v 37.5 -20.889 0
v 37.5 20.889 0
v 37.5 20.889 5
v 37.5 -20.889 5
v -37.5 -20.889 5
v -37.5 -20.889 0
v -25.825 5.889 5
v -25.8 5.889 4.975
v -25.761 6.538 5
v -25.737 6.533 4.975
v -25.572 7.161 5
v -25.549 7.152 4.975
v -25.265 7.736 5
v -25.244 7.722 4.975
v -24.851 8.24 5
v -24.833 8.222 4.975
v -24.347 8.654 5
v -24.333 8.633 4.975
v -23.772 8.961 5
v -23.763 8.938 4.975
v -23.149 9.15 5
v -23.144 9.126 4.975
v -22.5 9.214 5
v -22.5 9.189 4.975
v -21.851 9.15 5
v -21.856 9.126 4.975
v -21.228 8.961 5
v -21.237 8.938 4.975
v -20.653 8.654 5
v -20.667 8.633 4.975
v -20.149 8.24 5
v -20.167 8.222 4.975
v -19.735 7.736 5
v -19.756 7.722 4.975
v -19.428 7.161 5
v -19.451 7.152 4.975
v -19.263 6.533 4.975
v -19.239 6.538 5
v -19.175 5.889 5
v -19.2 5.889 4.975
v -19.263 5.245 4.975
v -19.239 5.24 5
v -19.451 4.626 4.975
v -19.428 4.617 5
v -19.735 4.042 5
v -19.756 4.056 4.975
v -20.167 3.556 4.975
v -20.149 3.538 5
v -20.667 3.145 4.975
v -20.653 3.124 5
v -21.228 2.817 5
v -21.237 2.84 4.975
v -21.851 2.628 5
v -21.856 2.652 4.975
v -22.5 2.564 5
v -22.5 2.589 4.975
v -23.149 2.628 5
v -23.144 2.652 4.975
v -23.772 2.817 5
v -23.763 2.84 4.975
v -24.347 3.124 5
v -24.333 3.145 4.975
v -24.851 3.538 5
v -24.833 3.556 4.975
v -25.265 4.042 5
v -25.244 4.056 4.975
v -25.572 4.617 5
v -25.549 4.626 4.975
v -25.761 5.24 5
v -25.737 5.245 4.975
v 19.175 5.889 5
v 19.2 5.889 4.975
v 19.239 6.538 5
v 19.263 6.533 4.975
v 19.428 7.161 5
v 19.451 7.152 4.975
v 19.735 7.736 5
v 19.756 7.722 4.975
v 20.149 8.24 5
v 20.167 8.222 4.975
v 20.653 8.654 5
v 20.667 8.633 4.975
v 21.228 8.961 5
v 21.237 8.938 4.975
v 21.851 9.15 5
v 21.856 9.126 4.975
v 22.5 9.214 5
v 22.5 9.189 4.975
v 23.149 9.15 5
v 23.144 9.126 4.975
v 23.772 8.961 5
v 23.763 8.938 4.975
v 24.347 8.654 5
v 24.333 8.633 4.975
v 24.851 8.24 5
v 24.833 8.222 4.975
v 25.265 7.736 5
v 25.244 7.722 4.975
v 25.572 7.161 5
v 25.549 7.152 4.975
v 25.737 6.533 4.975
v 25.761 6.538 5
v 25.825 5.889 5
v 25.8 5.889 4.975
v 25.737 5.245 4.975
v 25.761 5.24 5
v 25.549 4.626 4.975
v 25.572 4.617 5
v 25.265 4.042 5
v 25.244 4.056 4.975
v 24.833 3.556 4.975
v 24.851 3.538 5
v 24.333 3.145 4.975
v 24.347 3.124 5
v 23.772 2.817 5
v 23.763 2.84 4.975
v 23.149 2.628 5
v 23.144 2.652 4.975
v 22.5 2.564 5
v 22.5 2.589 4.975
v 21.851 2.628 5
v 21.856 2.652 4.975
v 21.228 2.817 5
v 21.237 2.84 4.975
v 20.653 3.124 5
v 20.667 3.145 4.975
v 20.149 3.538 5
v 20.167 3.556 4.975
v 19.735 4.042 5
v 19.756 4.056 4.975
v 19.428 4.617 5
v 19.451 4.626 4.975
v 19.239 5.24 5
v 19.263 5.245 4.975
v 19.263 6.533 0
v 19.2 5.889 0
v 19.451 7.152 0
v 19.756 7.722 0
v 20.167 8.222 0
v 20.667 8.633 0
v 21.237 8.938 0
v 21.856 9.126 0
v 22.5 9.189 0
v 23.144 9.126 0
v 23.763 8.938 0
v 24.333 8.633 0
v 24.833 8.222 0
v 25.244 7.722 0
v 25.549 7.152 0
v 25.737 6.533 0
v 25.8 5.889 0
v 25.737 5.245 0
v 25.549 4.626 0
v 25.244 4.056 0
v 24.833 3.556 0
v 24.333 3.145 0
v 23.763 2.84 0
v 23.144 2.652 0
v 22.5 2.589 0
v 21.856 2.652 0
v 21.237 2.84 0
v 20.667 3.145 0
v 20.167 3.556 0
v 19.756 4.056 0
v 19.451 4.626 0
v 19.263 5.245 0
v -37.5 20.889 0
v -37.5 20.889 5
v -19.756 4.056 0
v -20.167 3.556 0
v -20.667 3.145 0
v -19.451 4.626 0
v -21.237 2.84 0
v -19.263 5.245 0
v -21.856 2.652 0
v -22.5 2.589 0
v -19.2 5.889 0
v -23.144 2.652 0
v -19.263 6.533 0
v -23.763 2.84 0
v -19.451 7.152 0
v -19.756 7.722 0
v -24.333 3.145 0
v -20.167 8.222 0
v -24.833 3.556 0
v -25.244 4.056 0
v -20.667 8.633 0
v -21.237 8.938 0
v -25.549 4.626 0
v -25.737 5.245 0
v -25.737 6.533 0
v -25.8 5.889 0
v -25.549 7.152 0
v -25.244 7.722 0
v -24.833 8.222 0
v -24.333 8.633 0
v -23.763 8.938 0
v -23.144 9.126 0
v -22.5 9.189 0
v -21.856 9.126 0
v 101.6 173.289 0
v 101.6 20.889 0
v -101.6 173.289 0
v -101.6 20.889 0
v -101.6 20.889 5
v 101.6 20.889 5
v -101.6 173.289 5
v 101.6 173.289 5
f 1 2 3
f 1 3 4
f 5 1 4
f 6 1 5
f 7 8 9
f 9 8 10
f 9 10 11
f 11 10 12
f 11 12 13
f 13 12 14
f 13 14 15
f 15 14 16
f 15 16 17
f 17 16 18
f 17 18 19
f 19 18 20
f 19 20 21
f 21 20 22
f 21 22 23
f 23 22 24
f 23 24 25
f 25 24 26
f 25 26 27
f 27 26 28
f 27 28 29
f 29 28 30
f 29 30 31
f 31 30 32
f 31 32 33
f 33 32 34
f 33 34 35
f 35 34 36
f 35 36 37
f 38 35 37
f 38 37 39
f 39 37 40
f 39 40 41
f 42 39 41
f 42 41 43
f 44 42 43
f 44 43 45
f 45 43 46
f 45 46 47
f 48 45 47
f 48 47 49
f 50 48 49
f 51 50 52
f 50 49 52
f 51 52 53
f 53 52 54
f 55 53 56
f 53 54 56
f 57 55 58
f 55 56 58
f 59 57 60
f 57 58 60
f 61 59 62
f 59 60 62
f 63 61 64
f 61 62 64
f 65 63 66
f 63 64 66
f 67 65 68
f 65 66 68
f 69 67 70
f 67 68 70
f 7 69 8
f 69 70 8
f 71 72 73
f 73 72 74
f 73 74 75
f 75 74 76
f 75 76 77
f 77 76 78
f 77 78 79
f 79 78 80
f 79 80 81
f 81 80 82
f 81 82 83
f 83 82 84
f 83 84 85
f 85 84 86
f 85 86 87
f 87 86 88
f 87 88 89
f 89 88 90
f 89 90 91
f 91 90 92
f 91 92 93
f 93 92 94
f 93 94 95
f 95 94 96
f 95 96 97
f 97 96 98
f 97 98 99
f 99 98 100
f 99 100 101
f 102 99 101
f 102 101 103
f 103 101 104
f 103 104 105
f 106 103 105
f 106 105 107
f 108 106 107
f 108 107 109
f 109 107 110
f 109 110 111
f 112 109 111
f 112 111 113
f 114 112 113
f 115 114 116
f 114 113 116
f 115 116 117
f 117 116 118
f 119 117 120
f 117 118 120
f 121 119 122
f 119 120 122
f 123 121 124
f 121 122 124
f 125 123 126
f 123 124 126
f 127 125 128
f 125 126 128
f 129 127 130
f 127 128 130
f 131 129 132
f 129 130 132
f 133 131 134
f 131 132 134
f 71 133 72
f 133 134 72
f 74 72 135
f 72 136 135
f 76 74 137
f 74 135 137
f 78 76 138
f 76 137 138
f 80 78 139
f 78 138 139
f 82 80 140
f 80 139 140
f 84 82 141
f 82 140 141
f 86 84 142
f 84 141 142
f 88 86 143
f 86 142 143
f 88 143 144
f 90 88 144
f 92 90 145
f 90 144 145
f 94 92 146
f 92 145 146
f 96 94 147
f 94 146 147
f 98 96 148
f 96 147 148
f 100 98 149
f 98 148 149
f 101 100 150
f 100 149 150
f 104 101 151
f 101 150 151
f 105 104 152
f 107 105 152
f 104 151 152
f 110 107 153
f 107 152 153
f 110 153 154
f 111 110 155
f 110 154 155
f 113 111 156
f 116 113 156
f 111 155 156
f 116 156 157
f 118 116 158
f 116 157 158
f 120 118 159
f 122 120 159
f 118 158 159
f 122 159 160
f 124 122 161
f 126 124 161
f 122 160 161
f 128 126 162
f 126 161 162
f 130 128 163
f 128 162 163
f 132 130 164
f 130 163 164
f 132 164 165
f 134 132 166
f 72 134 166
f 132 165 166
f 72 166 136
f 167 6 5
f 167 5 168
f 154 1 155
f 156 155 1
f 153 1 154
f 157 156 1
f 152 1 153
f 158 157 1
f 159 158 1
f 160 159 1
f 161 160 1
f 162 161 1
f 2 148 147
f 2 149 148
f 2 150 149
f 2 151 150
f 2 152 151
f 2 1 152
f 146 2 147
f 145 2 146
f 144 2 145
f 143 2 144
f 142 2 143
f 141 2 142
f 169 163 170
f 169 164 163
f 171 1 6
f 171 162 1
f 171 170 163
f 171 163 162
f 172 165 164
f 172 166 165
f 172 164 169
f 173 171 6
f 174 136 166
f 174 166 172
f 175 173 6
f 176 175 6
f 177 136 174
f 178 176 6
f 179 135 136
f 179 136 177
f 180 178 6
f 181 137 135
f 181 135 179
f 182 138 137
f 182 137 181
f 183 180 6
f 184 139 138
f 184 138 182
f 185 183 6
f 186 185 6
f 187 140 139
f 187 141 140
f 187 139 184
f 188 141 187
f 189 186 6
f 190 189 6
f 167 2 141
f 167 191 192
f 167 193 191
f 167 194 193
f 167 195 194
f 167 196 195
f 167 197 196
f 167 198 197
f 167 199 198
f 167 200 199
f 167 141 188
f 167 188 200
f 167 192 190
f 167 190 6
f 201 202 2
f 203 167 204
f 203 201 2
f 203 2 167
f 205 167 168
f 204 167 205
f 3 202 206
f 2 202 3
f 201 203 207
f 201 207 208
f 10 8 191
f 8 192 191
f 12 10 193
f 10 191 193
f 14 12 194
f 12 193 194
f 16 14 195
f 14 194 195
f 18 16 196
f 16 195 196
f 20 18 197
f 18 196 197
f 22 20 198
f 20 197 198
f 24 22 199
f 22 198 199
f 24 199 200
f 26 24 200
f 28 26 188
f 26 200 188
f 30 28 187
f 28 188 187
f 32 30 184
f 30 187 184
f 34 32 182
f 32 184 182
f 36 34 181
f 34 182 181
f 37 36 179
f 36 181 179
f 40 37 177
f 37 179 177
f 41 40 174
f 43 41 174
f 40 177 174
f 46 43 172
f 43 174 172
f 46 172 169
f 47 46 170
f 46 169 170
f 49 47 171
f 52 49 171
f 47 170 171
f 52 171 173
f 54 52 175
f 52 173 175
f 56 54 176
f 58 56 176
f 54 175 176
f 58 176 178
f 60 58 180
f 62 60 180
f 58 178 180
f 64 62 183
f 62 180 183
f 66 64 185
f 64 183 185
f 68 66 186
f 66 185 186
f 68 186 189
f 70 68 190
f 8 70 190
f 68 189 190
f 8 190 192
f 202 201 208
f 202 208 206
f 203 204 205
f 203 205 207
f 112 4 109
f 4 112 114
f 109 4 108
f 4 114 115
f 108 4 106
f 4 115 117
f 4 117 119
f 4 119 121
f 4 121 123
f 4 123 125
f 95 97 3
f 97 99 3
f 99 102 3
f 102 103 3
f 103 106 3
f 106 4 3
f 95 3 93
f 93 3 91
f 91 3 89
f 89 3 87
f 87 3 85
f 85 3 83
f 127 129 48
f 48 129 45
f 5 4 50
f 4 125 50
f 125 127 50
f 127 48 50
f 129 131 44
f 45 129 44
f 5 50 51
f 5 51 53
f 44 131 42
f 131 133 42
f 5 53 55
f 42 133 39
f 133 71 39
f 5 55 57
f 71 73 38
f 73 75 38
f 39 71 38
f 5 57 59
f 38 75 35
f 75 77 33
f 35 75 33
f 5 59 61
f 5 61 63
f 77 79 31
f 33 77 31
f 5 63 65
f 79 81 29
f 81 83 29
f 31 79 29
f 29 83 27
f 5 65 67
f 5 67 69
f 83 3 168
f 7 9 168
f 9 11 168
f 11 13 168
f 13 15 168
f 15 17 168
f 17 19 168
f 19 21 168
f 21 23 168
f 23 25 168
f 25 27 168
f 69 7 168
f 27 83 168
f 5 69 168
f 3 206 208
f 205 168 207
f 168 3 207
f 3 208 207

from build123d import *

# Parameters (mm, degrees)
BOSS_EXTRUDE2_DEPTH            = 5
M6_CLEARANCE_HOLE2_D           = 6.6
M6_CLEARANCE_HOLE2_CSINK_D     = 6.65
M6_CLEARANCE_HOLE2_CSINK_ANGLE = 90


with BuildPart() as part:
    # Sketch1 → Boss-Extrude2 (new body)
    with BuildSketch(Plane.XY):
        Polygon((-37.5, 20.889), (-101.6, 20.889), (-101.6, 173.289), (101.6, 173.289), (101.6, 20.889), (37.5, 20.889), (37.5, -20.889), (-37.5, -20.889), align=None)
    extrude(amount=BOSS_EXTRUDE2_DEPTH)

    # M6 Clearance Hole2 (through all)
    with Locations(Plane.XY.offset(5)):
        with Locations((-22.5, 5.889), (22.5, 5.889)):
            CounterSinkHole(M6_CLEARANCE_HOLE2_D / 2, M6_CLEARANCE_HOLE2_CSINK_D / 2, counter_sink_angle=M6_CLEARANCE_HOLE2_CSINK_ANGLE)


solid = part.part
